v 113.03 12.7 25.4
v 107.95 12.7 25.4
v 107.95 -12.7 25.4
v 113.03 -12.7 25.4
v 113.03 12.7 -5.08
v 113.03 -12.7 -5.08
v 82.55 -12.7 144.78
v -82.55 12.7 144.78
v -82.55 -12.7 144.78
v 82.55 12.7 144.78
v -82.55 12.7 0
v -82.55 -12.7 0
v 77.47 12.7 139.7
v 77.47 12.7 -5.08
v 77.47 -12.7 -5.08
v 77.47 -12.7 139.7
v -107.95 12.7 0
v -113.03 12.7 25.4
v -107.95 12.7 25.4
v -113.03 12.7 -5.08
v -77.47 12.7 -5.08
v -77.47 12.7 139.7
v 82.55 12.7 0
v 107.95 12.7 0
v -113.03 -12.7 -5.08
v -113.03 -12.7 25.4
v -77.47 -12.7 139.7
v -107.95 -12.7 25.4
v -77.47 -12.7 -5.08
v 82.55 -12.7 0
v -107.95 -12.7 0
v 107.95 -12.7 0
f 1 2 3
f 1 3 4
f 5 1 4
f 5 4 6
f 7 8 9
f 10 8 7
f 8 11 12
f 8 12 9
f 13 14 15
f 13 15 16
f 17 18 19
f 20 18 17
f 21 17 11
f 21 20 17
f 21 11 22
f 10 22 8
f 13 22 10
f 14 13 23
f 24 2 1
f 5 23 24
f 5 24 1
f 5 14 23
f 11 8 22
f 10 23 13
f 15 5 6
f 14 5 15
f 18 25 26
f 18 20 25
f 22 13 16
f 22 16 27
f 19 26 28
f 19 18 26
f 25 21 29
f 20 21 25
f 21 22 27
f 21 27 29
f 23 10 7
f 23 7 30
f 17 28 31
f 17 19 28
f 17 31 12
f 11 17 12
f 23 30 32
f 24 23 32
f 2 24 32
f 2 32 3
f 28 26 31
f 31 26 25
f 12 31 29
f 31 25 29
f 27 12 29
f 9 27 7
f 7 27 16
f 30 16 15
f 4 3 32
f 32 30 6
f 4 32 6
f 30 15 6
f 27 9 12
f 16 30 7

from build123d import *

# Parameters (mm, degrees)
BOSS_EXTRUDE1_DEPTH = 12.7


with BuildPart() as part:
    # Sketch1 → Boss-Extrude1 (new, symmetric)
    with BuildSketch(Plane(origin=(0, 0, 0), x_dir=(1, 0, 0), z_dir=(0, 1, 0))):
        Polygon((-107.95, -25.4), (-107.95, 0), (-82.55, 0), (-82.55, -144.78), (82.55, -144.78), (82.55, 0), (107.95, 0), (107.95, -25.4), (113.03, -25.4), (113.03, 5.08), (77.47, 5.08), (77.47, -139.7), (-77.47, -139.7), (-77.47, 5.08), (-113.03, 5.08), (-113.03, -25.4), align=None)
    extrude(amount=BOSS_EXTRUDE1_DEPTH, both=True)


solid = part.part
